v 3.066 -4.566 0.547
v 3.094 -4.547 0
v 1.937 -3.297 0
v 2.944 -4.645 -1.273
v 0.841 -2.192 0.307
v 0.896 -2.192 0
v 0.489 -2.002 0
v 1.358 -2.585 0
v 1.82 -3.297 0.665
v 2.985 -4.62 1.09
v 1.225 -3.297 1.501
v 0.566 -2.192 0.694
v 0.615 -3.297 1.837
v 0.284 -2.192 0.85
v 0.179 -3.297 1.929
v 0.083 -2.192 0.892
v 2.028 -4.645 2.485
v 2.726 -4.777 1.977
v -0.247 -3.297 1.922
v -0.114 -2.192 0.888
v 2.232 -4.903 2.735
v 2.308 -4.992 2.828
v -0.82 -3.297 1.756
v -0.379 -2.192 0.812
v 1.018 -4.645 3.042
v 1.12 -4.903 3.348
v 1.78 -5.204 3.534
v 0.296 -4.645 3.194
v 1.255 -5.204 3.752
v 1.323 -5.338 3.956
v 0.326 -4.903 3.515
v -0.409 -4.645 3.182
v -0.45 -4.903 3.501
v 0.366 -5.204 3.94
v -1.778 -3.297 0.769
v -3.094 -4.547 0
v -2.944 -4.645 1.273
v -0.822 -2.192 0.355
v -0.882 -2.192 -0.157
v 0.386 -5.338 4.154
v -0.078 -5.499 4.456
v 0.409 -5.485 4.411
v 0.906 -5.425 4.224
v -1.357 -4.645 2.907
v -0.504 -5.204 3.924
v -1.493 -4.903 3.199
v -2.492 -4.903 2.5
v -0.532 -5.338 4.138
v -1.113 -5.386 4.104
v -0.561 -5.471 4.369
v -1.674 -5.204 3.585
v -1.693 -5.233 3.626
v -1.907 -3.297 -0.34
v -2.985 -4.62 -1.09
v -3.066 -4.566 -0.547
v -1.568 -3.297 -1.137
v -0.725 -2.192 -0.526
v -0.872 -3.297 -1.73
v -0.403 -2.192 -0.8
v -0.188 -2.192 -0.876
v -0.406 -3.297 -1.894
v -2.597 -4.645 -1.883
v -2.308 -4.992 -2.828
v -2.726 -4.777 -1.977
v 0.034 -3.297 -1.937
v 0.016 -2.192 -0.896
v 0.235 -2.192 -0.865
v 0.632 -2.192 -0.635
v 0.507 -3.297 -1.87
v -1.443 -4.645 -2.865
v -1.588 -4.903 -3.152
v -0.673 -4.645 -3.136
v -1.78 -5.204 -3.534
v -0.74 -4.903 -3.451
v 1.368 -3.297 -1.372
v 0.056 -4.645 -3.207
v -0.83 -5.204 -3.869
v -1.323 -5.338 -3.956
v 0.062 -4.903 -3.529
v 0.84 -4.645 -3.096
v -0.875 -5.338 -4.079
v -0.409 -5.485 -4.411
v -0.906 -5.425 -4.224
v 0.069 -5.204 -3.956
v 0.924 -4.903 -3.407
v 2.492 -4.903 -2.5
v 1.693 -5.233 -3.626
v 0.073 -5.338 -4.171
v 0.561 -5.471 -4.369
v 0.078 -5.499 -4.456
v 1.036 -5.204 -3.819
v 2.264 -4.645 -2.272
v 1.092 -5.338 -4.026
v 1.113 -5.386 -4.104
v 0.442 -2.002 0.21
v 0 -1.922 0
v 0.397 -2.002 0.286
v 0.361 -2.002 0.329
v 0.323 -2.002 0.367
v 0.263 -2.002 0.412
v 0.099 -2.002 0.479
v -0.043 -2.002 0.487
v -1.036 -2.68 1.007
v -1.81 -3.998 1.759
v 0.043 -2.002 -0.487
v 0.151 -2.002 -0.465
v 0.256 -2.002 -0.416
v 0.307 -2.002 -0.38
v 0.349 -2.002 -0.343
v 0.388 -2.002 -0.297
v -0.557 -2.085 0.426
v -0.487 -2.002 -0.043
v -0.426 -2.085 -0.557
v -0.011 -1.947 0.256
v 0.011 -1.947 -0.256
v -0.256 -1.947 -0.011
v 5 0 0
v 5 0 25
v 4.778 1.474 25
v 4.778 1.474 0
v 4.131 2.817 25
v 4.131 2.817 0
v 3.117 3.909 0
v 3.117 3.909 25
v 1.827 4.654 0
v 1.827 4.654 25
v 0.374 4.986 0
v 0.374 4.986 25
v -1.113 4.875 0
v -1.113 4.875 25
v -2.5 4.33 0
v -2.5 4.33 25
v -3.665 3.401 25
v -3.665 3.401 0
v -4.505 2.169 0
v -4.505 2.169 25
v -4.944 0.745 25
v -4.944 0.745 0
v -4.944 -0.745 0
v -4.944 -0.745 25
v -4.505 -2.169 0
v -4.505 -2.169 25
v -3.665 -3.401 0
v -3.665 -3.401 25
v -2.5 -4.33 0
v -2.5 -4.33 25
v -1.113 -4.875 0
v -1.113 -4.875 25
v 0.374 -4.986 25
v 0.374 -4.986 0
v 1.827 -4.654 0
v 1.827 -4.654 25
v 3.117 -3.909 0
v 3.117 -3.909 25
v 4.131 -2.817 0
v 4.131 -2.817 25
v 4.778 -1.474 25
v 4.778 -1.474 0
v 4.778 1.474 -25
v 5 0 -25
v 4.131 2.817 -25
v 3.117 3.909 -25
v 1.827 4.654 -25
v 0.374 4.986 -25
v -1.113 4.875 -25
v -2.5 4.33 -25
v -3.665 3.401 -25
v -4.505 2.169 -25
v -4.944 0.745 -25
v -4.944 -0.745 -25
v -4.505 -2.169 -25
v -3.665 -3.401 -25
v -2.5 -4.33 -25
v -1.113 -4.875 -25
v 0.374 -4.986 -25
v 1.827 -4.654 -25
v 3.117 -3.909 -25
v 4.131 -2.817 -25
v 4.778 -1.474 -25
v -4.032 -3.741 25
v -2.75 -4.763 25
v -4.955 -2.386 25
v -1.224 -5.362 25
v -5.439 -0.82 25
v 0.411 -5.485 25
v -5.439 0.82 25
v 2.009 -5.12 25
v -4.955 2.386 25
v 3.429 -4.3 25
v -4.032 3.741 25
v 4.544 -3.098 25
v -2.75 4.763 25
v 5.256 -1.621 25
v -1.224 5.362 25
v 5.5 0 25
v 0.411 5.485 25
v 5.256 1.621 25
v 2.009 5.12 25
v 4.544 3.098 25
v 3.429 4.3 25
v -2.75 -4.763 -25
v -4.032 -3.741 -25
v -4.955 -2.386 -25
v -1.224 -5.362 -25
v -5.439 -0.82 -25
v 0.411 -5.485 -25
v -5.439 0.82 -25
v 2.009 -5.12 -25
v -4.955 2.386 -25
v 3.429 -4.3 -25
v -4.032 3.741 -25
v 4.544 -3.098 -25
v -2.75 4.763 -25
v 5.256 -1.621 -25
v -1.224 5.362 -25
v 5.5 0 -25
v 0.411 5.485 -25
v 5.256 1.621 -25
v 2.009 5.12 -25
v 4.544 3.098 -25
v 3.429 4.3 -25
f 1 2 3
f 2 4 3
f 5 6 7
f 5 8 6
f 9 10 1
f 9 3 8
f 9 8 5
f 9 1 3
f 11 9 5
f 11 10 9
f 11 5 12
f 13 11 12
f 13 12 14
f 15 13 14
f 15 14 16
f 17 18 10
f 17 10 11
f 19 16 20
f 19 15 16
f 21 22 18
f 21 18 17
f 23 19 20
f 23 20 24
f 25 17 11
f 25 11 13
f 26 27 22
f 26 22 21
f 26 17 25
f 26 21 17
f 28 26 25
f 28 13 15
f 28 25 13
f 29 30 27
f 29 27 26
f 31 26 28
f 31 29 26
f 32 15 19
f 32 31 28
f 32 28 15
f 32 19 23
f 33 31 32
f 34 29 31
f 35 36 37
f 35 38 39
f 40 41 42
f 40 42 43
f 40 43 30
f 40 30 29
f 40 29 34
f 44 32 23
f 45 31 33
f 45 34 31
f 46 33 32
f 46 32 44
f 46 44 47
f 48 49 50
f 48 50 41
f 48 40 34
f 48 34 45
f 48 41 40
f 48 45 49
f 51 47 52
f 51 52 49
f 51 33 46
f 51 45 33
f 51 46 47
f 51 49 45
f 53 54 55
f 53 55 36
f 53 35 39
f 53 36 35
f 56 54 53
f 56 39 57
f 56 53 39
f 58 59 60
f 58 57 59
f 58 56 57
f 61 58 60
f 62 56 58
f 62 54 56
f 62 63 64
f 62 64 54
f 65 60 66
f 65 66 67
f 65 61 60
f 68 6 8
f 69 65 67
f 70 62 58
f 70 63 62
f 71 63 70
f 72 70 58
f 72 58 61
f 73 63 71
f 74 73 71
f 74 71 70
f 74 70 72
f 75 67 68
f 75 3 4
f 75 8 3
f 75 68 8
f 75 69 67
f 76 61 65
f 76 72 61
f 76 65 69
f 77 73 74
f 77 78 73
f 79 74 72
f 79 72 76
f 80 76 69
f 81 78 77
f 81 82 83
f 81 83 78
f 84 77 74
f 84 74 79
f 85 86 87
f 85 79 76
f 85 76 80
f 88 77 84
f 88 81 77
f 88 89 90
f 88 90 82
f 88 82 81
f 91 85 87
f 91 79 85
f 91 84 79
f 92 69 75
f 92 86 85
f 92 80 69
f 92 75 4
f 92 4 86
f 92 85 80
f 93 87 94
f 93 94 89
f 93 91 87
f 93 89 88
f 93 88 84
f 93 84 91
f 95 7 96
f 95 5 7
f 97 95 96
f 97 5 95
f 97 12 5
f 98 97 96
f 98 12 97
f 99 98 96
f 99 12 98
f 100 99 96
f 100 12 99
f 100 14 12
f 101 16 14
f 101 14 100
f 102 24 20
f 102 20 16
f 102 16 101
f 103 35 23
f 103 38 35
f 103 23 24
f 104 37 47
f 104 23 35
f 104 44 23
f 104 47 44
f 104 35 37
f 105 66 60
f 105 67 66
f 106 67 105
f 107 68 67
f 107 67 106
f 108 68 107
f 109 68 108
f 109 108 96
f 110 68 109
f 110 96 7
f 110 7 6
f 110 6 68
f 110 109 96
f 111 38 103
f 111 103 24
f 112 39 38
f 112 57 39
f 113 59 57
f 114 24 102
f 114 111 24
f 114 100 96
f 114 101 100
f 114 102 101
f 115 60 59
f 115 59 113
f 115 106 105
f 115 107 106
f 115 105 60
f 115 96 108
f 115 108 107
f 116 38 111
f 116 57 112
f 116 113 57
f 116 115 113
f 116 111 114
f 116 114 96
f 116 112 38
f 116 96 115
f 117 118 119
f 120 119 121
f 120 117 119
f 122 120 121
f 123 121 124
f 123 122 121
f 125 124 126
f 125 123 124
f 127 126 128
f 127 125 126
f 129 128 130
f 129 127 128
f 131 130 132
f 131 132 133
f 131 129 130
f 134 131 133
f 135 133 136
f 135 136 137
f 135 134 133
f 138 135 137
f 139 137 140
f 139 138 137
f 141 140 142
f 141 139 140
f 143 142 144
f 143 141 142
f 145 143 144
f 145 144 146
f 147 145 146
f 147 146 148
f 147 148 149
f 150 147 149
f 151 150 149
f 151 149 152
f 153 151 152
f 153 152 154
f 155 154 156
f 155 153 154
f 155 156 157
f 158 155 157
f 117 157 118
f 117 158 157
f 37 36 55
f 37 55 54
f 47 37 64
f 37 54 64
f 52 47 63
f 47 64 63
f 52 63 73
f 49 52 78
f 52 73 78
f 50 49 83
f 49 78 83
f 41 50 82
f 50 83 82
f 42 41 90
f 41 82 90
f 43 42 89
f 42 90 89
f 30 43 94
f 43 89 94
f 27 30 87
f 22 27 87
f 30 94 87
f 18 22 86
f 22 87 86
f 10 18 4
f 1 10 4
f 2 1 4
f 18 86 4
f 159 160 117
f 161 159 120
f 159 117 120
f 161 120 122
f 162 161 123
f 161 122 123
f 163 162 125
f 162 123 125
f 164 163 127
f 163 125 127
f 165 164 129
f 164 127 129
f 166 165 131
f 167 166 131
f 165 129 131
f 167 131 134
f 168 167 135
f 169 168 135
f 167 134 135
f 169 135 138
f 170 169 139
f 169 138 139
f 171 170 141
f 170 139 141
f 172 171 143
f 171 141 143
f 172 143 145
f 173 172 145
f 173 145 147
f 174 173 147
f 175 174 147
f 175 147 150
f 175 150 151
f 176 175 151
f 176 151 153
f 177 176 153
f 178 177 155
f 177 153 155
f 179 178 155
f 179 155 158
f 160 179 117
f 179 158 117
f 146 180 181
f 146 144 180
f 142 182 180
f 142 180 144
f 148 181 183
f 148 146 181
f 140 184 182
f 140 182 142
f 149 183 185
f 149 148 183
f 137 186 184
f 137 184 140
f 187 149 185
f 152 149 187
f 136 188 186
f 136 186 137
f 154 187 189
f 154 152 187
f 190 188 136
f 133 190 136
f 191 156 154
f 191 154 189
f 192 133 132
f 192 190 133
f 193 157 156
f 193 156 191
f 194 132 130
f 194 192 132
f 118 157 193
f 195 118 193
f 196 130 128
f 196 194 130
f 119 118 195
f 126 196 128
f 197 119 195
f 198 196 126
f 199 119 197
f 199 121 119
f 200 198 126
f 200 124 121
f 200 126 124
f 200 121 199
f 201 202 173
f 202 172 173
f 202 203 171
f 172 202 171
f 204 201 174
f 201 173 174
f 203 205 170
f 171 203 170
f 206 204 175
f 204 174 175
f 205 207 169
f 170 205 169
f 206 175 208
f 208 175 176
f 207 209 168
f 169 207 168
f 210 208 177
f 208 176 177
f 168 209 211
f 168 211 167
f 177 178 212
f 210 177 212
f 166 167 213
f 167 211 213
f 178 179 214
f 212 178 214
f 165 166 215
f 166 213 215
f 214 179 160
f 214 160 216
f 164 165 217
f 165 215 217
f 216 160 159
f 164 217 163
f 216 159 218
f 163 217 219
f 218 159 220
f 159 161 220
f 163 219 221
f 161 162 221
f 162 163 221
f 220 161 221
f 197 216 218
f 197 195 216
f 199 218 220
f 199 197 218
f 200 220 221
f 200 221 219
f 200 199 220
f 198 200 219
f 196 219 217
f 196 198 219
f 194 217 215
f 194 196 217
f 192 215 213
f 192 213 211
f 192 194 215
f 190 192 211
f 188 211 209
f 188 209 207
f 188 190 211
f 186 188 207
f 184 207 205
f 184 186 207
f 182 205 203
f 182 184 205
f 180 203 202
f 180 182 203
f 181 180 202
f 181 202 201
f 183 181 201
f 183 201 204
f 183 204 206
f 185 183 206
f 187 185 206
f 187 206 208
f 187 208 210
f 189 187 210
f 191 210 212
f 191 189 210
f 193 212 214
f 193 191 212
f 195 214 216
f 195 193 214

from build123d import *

# Parameters (mm, degrees)
SKETCH1_R                = 5.5
SKETCH1_R_2              = 5
BOSS_EXTRUDE1_DEPTH      = 25
BOSS_EXTRUDE1_DEPTH_BACK = 25
SKETCH5_R                = 10
SKETCH5_R_2              = 5.5
CUT_EXTRUDE1_DEPTH       = 26
CUT_EXTRUDE1_DEPTH_BACK  = 26


with BuildPart() as part:
    # Sketch1 → Boss-Extrude1 (new body, two sides)
    with BuildSketch(Plane.XY) as boss_extrude1_sk:
        Circle(SKETCH1_R)
        Circle(SKETCH1_R_2, mode=Mode.SUBTRACT)
    extrude(amount=BOSS_EXTRUDE1_DEPTH)
    extrude(boss_extrude1_sk.sketch, amount=-BOSS_EXTRUDE1_DEPTH_BACK)


with BuildPart() as body_2:
    # Sketch2 → Revolve1 (revolve)
    with BuildSketch(Plane.XY):
        with BuildLine():
            Line((5.975108931, -5.950302735), (0, -5.950302735))
            Line((0, -5.950302735), (0, -1.922251211))
            add(Edge.make_bspline(
                [(0, -1.922251211), (1.113001322, -1.956271274), (2.204544845, -4.193448832), (4.835203148, -5.950302735), (5.975108931, -5.950302735)],
                knots=[0, 0, 0, 0, 0.401420873, 1, 1, 1, 1], degree=3))
        make_face()
    revolve(axis=Axis((0, 2.861542665, 0), (0, -1, 0)))

    # Sketch5 → Cut-Extrude1 (cut, two sides)
    with BuildSketch(Plane.XY) as cut_extrude1_sk:
        Circle(SKETCH5_R)
        Circle(SKETCH5_R_2, mode=Mode.SUBTRACT)
    extrude(amount=CUT_EXTRUDE1_DEPTH, mode=Mode.SUBTRACT)
    extrude(cut_extrude1_sk.sketch, amount=-CUT_EXTRUDE1_DEPTH_BACK, mode=Mode.SUBTRACT)


solid = Compound([part.part, body_2.part])
